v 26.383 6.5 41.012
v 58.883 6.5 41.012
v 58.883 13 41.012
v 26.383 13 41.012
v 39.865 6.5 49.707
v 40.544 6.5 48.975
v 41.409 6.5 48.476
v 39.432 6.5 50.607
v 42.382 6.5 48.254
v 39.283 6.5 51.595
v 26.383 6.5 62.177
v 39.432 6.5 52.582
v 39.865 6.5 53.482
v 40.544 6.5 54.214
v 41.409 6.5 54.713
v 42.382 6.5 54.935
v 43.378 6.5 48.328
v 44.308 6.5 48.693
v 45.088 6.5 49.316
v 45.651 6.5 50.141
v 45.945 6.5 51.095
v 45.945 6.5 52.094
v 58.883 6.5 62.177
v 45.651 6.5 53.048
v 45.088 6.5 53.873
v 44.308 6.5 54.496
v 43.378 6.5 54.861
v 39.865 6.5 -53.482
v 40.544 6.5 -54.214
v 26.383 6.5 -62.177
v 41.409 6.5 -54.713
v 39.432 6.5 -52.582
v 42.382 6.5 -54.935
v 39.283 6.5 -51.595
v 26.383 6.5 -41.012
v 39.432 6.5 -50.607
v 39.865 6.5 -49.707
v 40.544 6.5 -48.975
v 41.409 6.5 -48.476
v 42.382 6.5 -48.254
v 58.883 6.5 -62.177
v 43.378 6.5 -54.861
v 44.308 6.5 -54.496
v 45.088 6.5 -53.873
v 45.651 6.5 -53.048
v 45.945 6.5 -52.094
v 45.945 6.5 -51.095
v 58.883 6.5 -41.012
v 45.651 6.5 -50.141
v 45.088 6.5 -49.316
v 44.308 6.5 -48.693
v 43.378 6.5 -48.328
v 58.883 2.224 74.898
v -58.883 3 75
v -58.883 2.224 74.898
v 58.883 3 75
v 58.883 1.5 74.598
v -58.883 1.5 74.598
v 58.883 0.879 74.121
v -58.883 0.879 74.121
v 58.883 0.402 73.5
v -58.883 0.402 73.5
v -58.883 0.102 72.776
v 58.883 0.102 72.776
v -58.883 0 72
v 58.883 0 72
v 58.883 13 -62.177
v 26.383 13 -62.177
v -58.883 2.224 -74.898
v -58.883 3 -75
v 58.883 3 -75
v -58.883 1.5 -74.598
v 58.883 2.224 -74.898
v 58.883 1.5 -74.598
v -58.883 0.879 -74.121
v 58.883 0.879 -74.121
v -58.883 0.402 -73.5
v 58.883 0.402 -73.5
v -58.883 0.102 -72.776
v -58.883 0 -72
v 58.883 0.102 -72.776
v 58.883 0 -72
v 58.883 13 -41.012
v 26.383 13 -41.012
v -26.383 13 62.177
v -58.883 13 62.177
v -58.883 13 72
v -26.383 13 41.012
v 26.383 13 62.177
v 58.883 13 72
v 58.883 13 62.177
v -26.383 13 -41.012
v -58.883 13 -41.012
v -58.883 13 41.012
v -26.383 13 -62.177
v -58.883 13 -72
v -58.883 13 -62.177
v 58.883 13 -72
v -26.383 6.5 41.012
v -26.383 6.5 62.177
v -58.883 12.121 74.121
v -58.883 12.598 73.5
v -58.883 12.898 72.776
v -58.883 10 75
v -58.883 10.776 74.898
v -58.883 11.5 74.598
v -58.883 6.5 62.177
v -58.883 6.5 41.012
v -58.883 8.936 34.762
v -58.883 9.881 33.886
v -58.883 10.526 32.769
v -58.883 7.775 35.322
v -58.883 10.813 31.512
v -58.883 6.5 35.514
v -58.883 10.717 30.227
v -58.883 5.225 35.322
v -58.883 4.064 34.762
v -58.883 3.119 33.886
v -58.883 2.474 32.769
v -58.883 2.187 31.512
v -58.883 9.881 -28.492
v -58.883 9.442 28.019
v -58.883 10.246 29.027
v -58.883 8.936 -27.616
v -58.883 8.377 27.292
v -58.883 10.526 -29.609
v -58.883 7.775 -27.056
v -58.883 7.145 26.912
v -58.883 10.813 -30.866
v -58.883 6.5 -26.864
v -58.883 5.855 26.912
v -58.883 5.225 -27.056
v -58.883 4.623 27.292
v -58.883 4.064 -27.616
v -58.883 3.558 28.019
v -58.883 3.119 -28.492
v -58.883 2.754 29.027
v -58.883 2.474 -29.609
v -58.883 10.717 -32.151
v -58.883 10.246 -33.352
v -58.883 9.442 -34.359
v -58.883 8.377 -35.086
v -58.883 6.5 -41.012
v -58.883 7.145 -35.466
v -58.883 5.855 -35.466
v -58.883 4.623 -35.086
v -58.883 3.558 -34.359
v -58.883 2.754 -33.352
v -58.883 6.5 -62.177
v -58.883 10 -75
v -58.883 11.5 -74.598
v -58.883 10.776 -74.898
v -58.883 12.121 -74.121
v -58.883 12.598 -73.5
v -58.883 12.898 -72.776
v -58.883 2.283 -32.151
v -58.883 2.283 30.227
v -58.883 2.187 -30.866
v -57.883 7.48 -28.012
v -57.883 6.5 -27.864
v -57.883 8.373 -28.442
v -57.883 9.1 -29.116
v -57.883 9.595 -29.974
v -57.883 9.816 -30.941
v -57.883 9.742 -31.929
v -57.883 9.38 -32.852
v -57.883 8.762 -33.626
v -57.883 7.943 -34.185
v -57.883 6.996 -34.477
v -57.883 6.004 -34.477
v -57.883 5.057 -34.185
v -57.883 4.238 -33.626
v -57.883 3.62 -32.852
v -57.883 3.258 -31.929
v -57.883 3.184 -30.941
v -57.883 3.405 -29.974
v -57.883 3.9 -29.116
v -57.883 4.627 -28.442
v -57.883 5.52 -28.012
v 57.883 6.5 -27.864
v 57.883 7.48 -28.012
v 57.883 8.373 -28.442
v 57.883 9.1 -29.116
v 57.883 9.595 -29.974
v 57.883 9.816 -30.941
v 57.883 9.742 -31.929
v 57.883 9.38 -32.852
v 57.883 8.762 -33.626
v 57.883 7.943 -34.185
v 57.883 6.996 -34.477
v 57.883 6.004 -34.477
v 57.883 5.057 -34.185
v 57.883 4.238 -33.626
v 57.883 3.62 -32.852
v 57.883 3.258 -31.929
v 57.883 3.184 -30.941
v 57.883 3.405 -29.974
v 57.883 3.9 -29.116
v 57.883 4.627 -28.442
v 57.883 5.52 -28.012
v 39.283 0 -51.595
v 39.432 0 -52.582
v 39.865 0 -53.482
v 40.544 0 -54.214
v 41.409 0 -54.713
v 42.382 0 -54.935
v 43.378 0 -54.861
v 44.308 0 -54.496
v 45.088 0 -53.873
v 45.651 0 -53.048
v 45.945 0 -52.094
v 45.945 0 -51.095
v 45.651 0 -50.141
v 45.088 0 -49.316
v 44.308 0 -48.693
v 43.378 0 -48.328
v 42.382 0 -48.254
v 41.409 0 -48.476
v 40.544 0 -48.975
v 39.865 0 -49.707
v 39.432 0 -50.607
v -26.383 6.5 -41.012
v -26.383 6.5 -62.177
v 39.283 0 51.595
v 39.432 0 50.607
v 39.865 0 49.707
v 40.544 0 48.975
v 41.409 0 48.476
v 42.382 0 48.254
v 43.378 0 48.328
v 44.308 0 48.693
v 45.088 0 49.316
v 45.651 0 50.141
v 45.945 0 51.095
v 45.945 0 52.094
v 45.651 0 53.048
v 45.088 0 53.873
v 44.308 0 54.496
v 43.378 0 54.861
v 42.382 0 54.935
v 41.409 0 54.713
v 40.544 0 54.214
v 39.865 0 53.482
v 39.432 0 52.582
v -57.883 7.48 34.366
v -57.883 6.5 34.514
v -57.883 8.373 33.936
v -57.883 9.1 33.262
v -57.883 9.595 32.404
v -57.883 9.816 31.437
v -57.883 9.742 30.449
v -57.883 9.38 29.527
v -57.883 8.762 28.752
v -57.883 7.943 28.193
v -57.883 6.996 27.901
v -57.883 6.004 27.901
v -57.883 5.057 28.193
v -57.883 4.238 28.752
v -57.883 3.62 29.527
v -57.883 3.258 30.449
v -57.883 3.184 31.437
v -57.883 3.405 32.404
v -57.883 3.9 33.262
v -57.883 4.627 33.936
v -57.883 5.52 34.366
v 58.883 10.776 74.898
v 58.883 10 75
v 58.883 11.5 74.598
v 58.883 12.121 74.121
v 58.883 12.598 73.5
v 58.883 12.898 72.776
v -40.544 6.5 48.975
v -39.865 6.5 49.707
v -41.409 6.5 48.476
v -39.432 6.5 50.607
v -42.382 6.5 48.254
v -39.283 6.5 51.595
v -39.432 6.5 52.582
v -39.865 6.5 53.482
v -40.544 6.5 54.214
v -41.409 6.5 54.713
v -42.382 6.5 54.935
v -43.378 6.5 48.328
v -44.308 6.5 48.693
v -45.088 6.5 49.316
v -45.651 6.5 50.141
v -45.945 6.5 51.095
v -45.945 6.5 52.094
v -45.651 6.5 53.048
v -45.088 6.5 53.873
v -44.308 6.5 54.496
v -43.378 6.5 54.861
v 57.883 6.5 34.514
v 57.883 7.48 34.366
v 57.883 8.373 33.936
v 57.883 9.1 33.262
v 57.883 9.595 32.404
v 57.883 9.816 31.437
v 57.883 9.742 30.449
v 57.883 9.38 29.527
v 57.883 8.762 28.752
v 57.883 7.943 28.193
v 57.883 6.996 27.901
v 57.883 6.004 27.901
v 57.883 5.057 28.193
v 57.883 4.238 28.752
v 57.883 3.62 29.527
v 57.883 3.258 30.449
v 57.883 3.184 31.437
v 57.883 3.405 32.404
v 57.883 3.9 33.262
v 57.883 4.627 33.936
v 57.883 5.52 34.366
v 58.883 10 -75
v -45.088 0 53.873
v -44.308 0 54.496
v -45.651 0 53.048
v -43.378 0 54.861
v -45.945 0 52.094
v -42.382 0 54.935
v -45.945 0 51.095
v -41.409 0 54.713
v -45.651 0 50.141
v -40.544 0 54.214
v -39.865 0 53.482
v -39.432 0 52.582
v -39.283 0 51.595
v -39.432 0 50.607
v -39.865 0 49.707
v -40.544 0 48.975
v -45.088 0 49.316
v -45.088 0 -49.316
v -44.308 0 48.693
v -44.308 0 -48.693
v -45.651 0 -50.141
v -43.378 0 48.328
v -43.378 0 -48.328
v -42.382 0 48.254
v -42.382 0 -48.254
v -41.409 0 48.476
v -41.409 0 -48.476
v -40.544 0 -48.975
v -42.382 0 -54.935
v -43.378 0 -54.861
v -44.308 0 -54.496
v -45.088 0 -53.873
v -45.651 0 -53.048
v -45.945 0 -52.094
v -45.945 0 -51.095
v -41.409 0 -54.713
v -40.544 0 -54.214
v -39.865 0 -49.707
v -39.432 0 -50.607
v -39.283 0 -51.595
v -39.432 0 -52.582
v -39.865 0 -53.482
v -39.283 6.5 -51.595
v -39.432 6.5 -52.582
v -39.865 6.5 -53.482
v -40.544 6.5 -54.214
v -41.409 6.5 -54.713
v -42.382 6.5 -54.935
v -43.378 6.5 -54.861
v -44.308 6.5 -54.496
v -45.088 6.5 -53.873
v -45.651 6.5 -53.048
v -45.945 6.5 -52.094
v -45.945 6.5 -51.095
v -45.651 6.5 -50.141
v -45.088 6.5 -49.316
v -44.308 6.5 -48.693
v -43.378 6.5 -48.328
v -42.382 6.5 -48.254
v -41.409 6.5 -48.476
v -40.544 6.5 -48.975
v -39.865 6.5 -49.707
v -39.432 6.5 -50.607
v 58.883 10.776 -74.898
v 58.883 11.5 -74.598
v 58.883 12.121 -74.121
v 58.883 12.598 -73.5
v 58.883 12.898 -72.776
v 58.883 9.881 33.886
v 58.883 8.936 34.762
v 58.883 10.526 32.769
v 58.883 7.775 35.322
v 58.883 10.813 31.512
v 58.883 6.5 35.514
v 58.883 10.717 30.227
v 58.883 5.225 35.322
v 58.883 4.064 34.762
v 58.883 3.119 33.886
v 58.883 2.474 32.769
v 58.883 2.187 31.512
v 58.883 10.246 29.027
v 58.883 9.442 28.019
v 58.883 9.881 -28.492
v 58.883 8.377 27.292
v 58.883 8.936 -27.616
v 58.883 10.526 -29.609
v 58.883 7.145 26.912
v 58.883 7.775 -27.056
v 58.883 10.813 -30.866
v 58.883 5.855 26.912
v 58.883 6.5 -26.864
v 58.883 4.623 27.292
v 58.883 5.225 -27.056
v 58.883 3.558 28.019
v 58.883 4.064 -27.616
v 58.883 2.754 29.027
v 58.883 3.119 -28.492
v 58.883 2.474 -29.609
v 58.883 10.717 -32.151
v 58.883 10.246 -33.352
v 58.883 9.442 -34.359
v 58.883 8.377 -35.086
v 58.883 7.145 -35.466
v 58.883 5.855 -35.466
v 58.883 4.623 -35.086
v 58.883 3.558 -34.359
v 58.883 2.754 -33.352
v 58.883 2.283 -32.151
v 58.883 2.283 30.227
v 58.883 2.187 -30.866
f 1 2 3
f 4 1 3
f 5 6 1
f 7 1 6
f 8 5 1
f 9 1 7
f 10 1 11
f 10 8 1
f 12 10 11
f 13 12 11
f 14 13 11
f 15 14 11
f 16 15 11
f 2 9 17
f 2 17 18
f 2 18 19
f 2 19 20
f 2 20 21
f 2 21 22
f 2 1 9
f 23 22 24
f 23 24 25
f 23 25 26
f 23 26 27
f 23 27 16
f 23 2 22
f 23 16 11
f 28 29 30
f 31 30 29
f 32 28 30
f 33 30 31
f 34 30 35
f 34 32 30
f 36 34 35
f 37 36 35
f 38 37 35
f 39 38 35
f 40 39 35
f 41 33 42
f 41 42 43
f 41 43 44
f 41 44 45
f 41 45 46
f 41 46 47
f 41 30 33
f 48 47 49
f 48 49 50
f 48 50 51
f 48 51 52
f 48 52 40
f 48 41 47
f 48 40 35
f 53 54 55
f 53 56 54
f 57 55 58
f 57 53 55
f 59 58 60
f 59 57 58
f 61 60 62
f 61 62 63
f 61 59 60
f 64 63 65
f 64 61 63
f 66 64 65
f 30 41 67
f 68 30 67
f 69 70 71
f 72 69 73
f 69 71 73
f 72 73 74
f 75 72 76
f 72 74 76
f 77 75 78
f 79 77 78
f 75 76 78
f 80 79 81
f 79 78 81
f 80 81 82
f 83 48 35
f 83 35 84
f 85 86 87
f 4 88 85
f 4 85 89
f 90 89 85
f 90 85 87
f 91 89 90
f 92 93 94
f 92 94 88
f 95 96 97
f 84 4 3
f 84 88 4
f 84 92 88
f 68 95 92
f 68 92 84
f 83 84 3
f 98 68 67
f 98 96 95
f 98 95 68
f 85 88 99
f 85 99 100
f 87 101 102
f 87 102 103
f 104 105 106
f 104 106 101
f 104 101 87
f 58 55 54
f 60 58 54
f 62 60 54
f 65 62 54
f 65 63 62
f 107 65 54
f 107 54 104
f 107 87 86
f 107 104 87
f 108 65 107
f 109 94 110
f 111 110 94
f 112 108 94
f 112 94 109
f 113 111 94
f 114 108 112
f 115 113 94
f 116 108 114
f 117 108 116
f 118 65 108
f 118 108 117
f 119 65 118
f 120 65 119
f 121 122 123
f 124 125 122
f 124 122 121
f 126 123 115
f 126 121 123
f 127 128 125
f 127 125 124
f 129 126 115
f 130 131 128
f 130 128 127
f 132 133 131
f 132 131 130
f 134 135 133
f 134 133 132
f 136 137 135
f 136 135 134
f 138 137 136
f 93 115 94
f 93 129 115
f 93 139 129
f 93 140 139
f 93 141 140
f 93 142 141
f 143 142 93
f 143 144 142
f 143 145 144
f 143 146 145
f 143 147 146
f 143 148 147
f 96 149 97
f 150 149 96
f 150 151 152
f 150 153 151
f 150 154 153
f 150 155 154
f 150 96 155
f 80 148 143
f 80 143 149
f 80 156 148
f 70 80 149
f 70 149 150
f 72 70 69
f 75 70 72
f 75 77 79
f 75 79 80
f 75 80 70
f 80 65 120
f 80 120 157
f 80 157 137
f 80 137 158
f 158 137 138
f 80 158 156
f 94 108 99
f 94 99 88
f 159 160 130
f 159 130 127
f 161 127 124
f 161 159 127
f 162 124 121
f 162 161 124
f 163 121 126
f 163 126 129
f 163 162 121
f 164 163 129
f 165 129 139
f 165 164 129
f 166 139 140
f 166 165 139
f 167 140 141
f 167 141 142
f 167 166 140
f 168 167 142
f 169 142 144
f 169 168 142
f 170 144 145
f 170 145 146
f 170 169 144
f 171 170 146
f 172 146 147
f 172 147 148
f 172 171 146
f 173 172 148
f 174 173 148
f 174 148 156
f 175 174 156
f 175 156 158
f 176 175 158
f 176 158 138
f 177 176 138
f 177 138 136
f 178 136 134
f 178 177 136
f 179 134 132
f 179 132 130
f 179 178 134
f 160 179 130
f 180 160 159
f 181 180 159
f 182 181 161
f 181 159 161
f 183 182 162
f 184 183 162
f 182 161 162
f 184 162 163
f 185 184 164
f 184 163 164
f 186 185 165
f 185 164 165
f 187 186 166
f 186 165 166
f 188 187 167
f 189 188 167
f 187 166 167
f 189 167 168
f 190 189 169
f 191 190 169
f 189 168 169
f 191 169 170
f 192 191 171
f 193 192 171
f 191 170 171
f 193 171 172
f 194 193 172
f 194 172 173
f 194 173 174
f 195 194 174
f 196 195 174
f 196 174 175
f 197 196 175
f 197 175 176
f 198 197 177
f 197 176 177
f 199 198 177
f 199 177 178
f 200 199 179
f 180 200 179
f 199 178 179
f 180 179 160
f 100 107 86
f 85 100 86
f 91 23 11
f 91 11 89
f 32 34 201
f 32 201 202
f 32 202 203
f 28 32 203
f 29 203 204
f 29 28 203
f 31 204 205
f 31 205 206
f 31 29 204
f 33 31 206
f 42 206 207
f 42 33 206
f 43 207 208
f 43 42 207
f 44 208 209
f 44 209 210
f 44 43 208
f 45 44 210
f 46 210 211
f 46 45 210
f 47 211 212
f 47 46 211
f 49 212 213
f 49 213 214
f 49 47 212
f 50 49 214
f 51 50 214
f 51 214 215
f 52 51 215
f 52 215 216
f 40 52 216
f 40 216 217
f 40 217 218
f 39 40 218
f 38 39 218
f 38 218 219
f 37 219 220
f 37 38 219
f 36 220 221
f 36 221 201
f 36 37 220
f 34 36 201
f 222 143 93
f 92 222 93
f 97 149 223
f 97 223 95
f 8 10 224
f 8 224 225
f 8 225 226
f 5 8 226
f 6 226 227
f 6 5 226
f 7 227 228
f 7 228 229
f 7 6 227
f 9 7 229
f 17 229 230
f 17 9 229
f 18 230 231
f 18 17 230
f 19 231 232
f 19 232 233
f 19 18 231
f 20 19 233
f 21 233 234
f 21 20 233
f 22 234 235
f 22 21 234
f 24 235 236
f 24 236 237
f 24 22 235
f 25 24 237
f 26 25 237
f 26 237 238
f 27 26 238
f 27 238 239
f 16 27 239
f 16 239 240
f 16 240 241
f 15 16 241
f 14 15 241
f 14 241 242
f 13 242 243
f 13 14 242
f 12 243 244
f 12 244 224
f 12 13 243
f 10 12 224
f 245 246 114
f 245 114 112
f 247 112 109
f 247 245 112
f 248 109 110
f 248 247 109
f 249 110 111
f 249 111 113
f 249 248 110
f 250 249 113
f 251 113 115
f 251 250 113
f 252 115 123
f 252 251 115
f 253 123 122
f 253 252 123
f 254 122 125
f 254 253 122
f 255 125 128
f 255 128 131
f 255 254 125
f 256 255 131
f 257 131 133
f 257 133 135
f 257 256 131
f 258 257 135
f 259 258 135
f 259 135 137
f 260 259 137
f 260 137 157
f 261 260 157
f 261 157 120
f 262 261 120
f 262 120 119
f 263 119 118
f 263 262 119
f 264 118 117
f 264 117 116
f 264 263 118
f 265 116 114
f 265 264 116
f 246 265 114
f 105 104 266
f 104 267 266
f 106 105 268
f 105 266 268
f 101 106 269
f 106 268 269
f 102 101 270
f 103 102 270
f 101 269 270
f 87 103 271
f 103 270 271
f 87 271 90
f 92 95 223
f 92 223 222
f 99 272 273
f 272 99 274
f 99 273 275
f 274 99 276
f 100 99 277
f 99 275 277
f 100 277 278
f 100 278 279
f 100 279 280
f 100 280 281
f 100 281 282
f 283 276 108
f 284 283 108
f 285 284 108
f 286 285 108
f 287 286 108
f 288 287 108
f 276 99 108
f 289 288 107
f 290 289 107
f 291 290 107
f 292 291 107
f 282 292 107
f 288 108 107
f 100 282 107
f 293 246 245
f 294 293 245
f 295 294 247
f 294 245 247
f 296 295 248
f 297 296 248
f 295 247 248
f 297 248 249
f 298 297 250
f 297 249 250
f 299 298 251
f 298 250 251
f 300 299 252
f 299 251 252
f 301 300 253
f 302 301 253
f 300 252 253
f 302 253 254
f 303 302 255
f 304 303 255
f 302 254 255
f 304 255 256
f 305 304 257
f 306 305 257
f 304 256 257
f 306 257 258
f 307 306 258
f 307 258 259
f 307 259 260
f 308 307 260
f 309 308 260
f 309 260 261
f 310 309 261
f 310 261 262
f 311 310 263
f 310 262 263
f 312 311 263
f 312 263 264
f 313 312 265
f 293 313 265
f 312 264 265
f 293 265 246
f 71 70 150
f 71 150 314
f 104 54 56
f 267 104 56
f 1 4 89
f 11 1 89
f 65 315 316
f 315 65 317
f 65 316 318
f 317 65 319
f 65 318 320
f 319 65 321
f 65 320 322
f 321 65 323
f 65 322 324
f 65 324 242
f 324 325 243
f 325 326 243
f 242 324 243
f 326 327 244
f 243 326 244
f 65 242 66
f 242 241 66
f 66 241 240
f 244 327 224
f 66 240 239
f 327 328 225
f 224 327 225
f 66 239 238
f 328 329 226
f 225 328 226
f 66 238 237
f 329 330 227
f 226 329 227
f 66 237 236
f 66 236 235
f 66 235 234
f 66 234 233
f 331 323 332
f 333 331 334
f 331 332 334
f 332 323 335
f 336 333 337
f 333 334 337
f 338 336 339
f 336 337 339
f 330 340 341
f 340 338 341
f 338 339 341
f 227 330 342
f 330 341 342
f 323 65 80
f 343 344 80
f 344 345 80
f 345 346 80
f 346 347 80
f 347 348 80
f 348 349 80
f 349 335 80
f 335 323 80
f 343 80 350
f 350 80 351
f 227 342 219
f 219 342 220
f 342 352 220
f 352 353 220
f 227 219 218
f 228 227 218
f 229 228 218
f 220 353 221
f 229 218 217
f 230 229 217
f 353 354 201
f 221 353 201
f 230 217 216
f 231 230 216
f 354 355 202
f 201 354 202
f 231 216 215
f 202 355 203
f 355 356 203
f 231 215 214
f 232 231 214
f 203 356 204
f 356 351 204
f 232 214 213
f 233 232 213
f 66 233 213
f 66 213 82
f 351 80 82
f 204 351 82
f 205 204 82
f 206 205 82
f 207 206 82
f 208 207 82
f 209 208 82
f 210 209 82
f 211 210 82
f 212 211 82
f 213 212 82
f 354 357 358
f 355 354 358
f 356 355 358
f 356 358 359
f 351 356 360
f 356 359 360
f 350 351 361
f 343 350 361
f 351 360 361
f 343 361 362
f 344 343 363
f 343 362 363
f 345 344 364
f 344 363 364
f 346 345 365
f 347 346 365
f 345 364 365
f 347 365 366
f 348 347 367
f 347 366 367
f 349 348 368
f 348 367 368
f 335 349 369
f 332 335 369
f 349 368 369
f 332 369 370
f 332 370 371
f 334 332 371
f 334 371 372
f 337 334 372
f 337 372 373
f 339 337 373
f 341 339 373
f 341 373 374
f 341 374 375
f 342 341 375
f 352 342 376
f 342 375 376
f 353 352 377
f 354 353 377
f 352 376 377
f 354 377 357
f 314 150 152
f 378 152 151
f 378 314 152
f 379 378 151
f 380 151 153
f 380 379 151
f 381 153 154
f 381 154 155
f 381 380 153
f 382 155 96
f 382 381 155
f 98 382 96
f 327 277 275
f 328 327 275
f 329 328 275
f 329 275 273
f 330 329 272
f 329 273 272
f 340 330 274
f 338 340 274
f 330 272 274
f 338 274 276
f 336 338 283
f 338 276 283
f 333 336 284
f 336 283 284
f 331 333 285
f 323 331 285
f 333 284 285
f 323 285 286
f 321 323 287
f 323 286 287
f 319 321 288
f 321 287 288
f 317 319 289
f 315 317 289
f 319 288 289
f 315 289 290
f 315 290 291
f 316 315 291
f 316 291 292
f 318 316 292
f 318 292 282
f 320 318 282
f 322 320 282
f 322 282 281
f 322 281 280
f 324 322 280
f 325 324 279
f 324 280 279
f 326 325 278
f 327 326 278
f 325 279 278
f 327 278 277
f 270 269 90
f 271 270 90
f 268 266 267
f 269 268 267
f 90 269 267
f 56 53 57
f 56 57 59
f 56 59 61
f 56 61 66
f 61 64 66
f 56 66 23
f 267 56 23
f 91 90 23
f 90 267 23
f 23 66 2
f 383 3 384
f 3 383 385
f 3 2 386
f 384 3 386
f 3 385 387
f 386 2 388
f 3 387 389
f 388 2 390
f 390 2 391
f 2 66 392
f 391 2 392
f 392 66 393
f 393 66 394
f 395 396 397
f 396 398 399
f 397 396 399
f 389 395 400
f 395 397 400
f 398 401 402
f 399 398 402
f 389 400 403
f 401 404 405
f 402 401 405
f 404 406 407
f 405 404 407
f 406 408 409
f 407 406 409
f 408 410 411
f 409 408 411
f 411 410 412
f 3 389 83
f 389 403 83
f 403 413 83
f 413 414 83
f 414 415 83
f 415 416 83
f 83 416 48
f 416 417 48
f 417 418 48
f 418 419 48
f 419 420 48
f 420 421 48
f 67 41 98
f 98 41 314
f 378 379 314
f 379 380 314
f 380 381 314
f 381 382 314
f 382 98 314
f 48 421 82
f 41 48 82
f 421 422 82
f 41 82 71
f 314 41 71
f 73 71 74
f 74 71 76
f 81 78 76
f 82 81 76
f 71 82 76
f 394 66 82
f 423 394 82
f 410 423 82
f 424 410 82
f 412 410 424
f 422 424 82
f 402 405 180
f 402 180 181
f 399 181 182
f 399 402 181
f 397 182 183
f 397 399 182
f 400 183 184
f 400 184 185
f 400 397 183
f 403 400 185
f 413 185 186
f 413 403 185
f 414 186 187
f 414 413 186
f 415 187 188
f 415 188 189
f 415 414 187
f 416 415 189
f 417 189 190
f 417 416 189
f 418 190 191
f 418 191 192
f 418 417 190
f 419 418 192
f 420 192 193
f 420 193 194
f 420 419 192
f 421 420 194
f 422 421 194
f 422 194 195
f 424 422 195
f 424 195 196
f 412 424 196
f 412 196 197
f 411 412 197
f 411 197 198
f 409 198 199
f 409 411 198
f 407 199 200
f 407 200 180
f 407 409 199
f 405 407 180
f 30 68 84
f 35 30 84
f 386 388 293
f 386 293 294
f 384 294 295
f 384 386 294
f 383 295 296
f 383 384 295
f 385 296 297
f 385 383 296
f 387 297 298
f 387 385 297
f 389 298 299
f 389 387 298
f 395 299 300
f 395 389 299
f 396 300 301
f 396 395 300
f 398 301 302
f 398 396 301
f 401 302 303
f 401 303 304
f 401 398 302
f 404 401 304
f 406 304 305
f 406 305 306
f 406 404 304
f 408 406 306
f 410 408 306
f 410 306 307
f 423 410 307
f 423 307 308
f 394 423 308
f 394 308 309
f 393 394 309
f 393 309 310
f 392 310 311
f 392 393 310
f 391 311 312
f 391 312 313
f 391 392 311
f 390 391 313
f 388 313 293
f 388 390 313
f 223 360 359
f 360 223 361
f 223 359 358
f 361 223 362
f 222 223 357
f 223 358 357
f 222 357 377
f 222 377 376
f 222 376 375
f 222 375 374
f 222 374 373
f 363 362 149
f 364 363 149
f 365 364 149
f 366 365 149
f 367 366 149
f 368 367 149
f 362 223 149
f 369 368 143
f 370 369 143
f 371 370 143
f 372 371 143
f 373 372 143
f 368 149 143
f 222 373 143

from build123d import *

# Parameters (mm, degrees)
SKETCH1_W           = 117.7655389
SKETCH1_H           = 150
BOSS_EXTRUDE1_DEPTH = 13
FILLET1_R           = 3
SKETCH2_W           = 21.16486665
SKETCH2_H           = 6.5
CUT_EXTRUDE1_DEPTH  = 32.5
SKETCH3_R           = 3.35
CUT_EXTRUDE2_DEPTH  = 6.5
SKETCH4_R           = 3.325
CUT_EXTRUDE3_DEPTH  = 117.765539
CHAMFER1_SIZE       = 1


with BuildPart() as part:
    # Sketch1 → Boss-Extrude1 (new body)
    with BuildSketch(Plane(origin=(0, 0, 0), x_dir=(1, 0, 0), z_dir=(0, 1, 0))):
        Rectangle(SKETCH1_W, SKETCH1_H)
    extrude(amount=BOSS_EXTRUDE1_DEPTH)

    # Fillet1
    fillet1_edges = [part.edges().sort_by_distance(p)[0] for p in [
        (0, 13, 75),
        (0, 0, 75),
        (0, 0, -75),
        (0, 13, -75),
    ]]
    fillet(fillet1_edges, radius=FILLET1_R)

    # Sketch2 → Cut-Extrude1 (cut)
    with BuildSketch(Plane.ZY.offset(58.88276945)):
        with Locations((-51.59450088, 9.75)):
            Rectangle(SKETCH2_W, SKETCH2_H)
        with Locations((51.59450088, 9.75)):
            Rectangle(SKETCH2_W, SKETCH2_H)
    cut_extrude1 = extrude(amount=-CUT_EXTRUDE1_DEPTH, mode=Mode.SUBTRACT)

    # Sketch3 → Cut-Extrude2 (cut)
    with BuildSketch(Plane(origin=(0, 6.5, 0), x_dir=(1, 0, 0), z_dir=(0, 1, 0))):
        with Locations((-42.63276945, 51.59450088)):
            Circle(SKETCH3_R)
        with Locations((-42.63276945, -51.59450088)):
            Circle(SKETCH3_R)
    cut_extrude2 = extrude(amount=-CUT_EXTRUDE2_DEPTH, mode=Mode.SUBTRACT)

    # Mirror1: Cut-Extrude1, Cut-Extrude2 across plane
    add(cut_extrude1.mirror(Plane(origin=(0, 0, 0), x_dir=(0, 0, 1), z_dir=(1, 0, 0))), mode=Mode.SUBTRACT)
    add(cut_extrude2.mirror(Plane(origin=(0, 0, 0), x_dir=(0, 0, 1), z_dir=(1, 0, 0))), mode=Mode.SUBTRACT)

    # Sketch4 → Cut-Extrude3 (cut)
    with BuildSketch(Plane.ZY.offset(58.88276945)):
        with Locations((31.18900176, 6.5)):
            Circle(SKETCH4_R)
        with Locations((-31.18900176, 6.5)):
            Circle(SKETCH4_R)
    extrude(amount=-CUT_EXTRUDE3_DEPTH, mode=Mode.SUBTRACT)

    # Chamfer1
    chamfer1_edges = [part.edges().sort_by_distance(p)[0] for p in [
        (-58.88276945, 6.5, 27.86400176),
        (58.88276955, 6.5, 27.86400176),
        (-58.88276945, 6.5, -34.51400176),
        (58.88276955, 6.5, -34.51400176),
    ]]
    chamfer(chamfer1_edges, length=CHAMFER1_SIZE)


solid = part.part
